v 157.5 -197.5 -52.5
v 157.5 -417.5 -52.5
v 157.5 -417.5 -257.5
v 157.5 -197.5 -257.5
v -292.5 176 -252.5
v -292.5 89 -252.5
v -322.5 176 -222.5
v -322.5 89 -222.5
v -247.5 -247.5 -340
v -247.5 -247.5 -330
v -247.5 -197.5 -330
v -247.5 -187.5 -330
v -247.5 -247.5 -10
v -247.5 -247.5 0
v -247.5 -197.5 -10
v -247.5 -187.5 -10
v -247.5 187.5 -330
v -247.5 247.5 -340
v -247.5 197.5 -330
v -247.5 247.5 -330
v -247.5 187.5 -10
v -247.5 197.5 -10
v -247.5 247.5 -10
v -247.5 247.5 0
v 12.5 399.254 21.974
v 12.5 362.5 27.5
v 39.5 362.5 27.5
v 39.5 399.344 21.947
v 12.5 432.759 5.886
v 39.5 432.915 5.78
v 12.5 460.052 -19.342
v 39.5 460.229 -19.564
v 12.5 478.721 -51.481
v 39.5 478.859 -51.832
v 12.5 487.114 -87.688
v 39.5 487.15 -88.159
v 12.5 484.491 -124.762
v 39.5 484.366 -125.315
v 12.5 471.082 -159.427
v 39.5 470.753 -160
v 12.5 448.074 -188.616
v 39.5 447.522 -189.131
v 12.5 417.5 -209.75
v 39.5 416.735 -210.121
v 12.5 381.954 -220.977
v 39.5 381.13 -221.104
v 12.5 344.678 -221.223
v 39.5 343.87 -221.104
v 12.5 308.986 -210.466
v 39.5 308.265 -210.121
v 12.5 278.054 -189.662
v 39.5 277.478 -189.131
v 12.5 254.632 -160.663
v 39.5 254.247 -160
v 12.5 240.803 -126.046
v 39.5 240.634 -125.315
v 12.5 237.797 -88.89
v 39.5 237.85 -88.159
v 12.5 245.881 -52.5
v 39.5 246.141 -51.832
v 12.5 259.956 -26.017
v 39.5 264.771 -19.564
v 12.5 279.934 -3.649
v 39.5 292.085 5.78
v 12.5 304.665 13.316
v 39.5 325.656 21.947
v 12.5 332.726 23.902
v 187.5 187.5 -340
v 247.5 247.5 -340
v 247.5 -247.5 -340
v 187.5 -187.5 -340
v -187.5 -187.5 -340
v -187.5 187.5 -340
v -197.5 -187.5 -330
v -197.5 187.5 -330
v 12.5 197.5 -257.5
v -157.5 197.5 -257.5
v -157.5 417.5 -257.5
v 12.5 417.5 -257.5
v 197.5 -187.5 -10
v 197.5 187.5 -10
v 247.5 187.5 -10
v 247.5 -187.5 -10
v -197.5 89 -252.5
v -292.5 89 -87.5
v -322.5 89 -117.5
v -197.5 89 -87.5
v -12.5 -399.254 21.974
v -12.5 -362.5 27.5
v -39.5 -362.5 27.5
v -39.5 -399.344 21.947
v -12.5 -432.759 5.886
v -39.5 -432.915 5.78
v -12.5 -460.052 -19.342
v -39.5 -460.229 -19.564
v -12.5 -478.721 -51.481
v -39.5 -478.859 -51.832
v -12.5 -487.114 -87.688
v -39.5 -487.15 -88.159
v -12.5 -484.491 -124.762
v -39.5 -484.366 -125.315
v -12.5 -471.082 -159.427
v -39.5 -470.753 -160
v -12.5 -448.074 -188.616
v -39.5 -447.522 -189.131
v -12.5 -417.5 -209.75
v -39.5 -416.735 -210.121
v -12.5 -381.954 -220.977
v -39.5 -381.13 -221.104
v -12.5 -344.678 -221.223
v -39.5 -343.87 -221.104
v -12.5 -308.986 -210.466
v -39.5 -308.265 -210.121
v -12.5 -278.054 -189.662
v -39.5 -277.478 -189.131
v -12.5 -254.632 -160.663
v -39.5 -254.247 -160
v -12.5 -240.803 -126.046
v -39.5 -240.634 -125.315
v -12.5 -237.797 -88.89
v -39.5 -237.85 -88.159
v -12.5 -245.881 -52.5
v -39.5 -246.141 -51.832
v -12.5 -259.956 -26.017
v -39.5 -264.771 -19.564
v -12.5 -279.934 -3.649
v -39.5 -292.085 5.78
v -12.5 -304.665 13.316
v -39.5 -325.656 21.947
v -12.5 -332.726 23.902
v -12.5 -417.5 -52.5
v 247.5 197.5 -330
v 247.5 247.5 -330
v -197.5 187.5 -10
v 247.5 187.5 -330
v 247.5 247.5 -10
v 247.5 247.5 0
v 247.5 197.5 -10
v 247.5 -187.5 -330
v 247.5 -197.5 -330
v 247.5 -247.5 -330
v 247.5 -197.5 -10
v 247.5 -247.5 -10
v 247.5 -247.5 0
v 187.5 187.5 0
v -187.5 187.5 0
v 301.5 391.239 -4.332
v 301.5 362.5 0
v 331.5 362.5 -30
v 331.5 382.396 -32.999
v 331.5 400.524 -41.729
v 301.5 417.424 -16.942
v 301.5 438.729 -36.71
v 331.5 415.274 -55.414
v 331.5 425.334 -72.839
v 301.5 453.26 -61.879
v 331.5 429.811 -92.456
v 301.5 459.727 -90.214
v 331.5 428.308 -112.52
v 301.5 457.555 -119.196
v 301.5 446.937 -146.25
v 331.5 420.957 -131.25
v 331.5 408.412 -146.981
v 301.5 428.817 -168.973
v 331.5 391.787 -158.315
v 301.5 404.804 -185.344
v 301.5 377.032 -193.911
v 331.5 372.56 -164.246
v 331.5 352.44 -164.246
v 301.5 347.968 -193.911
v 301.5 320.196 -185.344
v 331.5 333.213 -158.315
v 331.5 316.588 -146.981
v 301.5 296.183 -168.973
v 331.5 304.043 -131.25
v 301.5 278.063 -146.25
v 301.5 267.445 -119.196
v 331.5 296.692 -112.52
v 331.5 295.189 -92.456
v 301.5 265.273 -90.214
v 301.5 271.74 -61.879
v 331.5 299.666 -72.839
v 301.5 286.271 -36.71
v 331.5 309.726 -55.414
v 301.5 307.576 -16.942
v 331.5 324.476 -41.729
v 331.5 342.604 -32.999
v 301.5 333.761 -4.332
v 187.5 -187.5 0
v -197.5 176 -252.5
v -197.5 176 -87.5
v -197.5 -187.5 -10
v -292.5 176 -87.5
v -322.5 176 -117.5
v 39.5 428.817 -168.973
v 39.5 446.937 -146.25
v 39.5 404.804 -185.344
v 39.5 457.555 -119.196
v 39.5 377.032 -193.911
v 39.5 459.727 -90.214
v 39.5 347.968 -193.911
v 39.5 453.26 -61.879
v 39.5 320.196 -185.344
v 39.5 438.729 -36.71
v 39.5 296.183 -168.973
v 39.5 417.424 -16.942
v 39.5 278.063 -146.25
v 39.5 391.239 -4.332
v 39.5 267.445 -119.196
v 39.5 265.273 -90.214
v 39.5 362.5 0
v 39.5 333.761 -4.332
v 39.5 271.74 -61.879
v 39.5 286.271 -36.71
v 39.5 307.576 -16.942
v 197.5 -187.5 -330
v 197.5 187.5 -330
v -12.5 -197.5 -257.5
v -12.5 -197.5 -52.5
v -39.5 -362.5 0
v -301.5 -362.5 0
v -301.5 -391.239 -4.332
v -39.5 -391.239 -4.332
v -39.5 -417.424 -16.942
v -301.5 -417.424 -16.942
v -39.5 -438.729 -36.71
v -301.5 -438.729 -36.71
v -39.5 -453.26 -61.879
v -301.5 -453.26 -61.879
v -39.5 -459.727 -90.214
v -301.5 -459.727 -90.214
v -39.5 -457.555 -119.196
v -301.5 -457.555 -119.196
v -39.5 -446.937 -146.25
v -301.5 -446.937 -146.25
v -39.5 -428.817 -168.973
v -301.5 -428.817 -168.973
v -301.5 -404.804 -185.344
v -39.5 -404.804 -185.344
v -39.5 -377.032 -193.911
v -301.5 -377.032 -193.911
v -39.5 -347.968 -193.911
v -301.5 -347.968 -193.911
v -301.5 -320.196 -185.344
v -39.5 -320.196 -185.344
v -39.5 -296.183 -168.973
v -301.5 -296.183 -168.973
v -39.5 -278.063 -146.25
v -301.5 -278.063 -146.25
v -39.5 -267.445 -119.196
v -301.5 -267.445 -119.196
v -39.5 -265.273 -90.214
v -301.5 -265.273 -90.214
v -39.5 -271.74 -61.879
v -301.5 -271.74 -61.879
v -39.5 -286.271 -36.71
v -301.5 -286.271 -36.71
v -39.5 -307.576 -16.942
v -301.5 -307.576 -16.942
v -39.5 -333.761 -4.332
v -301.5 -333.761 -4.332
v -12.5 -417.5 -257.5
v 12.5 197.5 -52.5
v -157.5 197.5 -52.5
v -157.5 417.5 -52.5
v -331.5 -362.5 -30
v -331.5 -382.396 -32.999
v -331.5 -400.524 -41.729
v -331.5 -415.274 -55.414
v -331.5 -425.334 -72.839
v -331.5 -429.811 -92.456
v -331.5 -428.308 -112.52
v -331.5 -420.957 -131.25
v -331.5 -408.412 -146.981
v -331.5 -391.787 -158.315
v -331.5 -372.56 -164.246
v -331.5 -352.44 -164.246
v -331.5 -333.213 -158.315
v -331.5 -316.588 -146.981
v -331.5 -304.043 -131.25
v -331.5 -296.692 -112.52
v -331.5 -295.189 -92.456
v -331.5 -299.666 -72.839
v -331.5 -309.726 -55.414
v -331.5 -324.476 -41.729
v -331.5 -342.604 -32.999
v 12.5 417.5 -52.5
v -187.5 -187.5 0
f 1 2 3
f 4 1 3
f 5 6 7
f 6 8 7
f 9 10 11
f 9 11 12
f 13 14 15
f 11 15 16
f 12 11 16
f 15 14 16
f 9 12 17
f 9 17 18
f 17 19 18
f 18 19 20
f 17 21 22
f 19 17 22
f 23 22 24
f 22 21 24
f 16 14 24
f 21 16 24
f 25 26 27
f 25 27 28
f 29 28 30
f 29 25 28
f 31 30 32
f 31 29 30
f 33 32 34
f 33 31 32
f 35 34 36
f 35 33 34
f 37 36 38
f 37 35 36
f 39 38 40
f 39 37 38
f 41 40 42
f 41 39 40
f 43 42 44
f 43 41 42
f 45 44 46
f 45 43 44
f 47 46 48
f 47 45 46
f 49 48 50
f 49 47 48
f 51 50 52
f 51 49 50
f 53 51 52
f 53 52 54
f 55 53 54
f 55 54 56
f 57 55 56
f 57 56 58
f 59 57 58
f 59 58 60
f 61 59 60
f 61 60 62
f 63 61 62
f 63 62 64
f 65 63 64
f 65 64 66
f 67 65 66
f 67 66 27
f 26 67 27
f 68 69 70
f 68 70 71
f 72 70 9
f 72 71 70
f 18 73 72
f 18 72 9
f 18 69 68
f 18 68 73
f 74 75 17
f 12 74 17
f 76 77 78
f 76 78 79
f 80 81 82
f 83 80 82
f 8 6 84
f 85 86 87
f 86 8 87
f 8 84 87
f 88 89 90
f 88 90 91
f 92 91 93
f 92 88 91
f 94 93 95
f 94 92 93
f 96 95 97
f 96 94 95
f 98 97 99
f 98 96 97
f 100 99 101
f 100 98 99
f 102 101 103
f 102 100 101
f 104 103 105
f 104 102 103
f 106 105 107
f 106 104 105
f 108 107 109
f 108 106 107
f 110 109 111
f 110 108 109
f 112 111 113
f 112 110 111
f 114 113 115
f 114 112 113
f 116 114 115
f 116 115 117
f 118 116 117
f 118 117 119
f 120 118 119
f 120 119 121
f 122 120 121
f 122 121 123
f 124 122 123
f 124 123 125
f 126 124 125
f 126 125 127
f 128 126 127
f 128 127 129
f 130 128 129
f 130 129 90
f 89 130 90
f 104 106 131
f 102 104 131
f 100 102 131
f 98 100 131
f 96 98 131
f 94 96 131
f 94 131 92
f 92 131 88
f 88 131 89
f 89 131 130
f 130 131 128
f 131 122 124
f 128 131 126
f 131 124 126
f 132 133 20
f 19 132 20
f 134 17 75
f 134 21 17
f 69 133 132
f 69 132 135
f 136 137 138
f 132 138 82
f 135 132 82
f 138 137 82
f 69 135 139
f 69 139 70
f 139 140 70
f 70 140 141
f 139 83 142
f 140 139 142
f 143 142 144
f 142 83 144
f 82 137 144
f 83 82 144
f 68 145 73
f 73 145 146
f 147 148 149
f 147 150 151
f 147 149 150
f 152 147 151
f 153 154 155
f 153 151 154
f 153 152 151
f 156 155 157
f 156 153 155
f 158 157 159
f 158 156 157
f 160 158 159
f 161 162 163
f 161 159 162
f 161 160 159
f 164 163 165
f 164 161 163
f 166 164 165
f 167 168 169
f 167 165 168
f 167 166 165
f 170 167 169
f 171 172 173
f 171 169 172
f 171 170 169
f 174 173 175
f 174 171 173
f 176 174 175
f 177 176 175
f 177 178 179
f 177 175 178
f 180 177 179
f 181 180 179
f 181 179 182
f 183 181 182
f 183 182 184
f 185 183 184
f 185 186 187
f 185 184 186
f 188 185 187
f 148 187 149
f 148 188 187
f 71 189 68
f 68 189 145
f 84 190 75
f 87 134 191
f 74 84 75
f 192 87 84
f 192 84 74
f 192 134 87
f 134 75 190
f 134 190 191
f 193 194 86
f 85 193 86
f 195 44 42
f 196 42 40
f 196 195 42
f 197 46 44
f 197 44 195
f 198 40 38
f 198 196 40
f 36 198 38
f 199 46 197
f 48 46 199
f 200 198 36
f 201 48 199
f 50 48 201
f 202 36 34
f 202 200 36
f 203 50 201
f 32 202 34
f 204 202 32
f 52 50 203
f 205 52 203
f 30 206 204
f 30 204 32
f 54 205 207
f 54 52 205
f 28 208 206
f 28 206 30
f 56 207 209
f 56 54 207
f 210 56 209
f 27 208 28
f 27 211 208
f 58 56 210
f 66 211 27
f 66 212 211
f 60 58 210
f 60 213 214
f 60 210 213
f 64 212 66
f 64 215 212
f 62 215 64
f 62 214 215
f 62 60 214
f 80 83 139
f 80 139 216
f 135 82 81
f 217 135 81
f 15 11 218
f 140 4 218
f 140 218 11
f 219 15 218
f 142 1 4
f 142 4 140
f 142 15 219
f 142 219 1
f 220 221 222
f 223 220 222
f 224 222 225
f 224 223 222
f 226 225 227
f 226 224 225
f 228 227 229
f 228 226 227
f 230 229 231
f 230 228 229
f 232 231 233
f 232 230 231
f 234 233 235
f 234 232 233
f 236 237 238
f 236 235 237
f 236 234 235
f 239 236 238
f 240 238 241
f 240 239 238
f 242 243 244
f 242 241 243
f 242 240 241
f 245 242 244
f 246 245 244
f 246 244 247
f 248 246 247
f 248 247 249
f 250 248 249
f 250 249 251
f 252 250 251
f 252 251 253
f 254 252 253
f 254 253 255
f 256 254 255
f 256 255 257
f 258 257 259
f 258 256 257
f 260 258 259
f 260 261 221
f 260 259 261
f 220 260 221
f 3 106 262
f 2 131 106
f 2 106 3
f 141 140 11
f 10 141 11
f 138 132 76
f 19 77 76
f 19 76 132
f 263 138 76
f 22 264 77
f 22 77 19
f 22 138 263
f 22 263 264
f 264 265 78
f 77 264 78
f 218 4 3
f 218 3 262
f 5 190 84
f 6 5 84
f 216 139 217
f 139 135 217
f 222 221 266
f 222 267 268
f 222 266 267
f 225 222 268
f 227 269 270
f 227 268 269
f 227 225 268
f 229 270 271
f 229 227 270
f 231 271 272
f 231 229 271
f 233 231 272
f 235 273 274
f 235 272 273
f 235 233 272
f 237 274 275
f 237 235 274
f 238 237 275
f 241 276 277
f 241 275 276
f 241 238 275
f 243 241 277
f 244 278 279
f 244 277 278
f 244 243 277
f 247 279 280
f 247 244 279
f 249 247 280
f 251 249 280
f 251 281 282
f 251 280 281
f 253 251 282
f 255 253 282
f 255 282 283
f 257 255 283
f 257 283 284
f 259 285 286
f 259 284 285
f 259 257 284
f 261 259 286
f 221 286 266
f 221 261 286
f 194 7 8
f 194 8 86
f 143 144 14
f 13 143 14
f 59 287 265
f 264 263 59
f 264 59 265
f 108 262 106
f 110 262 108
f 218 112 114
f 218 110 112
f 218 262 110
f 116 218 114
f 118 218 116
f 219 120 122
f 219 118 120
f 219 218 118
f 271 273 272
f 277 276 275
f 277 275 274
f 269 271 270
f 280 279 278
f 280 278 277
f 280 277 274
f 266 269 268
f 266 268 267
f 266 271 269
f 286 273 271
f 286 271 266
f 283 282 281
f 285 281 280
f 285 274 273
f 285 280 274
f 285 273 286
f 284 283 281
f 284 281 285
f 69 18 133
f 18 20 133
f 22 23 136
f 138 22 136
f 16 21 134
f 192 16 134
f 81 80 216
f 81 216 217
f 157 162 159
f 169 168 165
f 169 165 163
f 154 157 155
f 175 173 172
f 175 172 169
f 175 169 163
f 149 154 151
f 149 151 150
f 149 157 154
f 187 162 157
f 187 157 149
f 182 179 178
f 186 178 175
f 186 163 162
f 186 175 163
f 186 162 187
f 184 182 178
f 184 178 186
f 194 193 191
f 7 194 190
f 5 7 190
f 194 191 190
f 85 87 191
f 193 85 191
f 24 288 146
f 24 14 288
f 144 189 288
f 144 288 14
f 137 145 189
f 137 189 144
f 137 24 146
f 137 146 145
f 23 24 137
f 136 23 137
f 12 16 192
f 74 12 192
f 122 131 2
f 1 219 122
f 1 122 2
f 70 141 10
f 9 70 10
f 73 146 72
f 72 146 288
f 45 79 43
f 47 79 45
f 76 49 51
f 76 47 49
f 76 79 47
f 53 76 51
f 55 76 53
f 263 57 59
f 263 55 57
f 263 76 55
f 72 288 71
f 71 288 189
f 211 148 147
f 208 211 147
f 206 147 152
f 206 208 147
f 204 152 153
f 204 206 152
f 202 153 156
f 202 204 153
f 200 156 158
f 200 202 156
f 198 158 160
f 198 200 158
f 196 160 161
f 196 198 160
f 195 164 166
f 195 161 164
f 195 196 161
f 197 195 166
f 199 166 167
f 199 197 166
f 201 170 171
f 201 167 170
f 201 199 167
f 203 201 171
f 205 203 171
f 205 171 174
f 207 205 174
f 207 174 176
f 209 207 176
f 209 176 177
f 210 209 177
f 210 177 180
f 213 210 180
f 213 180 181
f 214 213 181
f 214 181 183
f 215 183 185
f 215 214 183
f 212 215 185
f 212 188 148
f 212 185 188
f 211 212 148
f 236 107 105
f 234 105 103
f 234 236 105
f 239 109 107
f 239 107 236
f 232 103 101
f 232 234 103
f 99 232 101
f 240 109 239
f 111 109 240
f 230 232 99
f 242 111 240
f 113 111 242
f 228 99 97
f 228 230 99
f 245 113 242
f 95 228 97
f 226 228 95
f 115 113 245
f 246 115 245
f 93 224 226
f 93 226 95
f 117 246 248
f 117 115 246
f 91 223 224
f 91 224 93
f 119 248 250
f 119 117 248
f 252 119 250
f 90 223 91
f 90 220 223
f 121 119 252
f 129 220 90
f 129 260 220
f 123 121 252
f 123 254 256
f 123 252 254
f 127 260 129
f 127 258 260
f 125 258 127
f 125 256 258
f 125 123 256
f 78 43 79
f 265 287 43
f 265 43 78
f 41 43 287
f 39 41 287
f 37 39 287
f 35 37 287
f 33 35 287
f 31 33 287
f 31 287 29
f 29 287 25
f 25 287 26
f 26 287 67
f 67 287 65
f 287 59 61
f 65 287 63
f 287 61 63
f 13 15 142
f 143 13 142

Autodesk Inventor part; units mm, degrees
ref_plane "YZ Plane" through (0, 0, 0) normal (1, 0, 0) x (0, 1, 0)
ref_plane "XZ Plane" through (0, 0, 0) normal (0, 1, 0) x (-1, 0, 0)
ref_plane "XY Plane" through (0, 0, 0) normal (0, 0, 1) x (1, 0, 0)
sketch "Sketch1" plane through (0, 0, 0) normal (0, 0, 1) x (1, 0, 0)
  line L0 (-247.5, 247.5) -> (247.5, 247.5)
  line L1 (247.5, 247.5) -> (247.5, -247.5)
  line L2 (247.5, -247.5) -> (-247.5, -247.5)
  line L3 (-247.5, -247.5) -> (-247.5, 247.5)
  line L4 (-247.5, -247.5) -> (247.5, 247.5) construction
  point P0 (0, 0)
  point P1 (0, 0)
  dimension "d0" = 495
  dimension "d1" = 495
extrude "Extrusion1" add sketch "Sketch1" against normal blind 10
sketch "Sketch2" plane through (0, 0, -10) normal (0, 0, -1) x (-1, 0, 0)
  line L0 (197.5, -197.5) -> (-197.5, -197.5)
  line L1 (-197.5, -197.5) -> (-197.5, 197.5)
  line L2 (-197.5, 197.5) -> (197.5, 197.5)
  line L3 (197.5, 197.5) -> (197.5, -197.5)
  line L4 (197.5, -197.5) -> (-197.5, 197.5) construction
  line L5 (247.5, -247.5) -> (247.5, 247.5) projected
  line L6 (197.5, -197.5) -> (247.5, -197.5)
  line L7 (247.5, -197.5) -> (247.5, -187.5)
  line L8 (247.5, -187.5) -> (197.5, -187.5)
  line L9 (197.5, -187.5) -> (197.5, -197.5)
  line L10 (197.5, 197.5) -> (247.5, 197.5)
  line L11 (247.5, 197.5) -> (247.5, 187.5)
  line L12 (247.5, 187.5) -> (197.5, 187.5)
  line L13 (197.5, 187.5) -> (197.5, 197.5)
  line L14 (-247.5, 247.5) -> (-247.5, -247.5) projected
  line L15 (-197.5, -197.5) -> (-247.5, -197.5)
  line L16 (-247.5, -197.5) -> (-247.5, -187.5)
  line L17 (-247.5, -187.5) -> (-197.5, -187.5)
  line L18 (-197.5, -187.5) -> (-197.5, -197.5)
  line L19 (-197.5, 197.5) -> (-247.5, 197.5)
  line L20 (-247.5, 197.5) -> (-247.5, 187.5)
  line L21 (-247.5, 187.5) -> (-197.5, 187.5)
  line L22 (-197.5, 187.5) -> (-197.5, 197.5)
  point P0 (0, 0)
  point P1 (0, 0)
  dimension "d4" = 395
  dimension "d5" = 395
  dimension "d19" = 10
  dimension "d20" = 10
  dimension "d21" = 10
  dimension "d22" = 10
extrude "Extrusion2" add sketch "Sketch2" along normal blind 320 contours L0 L1 L2 L3 | L3 L8 L5 L6 | L15 L14 L17 L1 | L3 L10 L5 L12 | L21 L14 L19 L1
sketch "Sketch3" plane through (0, 0, -330) normal (0, 0, -1) x (-1, 0, 0)
  line L0 (-247.5, -247.5) -> (247.5, -247.5)
  line L1 (247.5, -247.5) -> (247.5, 247.5)
  line L2 (247.5, 247.5) -> (-247.5, 247.5)
  line L3 (-247.5, 247.5) -> (-247.5, -247.5)
  line L4 (-247.5, -247.5) -> (247.5, 247.5) construction
  point P0 (0, 0)
  point P1 (0, 0)
  dimension "d8" = 495
  dimension "d9" = 495
extrude "Extrusion3" add sketch "Sketch3" along normal blind 10
sketch "Sketch4" plane through (0, 0, 0) normal (0, 0, 1) x (1, 0, 0)
  line L0 (-187.5, -187.5) -> (187.5, -187.5)
  line L1 (187.5, -187.5) -> (187.5, 187.5)
  line L2 (187.5, 187.5) -> (-187.5, 187.5)
  line L3 (-187.5, 187.5) -> (-187.5, -187.5)
  line L4 (-187.5, -187.5) -> (187.5, 187.5) construction
  point P0 (0, 0)
  point P1 (0, 0)
  dimension "d12" = 375
  dimension "d13" = 375
extrude "Extrusion4" cut sketch "Sketch4" against normal through all
sketch "Sketch6" plane through (-247.5, -197.5, -10) normal (0, -1, 0) x (1, 0, 0)
  line L0 (235, -42.5) -> (405, -42.5)
  line L1 (405, -42.5) -> (405, -247.5)
  line L2 (405, -247.5) -> (235, -247.5)
  line L3 (235, -247.5) -> (235, -42.5)
  line L4 (235, -42.5) -> (405, -247.5) construction
  line L5 (495, 0) -> (495, -320) projected
  line L6 (495, -330) -> (0, -330) projected
  point P0 (247.5, 10)
  point P1 (320, -145)
  dimension "d23" = 205
  dimension "d24" = 170
  dimension "d25" = 175
  dimension "d26" = 185
extrude "Extrusion5" add sketch "Sketch6" along normal blind 220
sketch "Sketch7" plane through (-12.5, -197.5, -257.5) normal (-1, 0, 0) x (0, 0, 1)
  circle A0 centre (160, -165) radius 125
  line L0 (205, 0) -> (205, -220) projected
  line L1 (205, -220) -> (0, -220) projected
  point P0 (257.5, 197.5)
  dimension "d5" = 395
  dimension "d30" = 250
  dimension "d33" = 45
  dimension "d34" = 55
extrude "Extrusion6" add sketch "Sketch7" along normal blind 27
sketch "Sketch8" plane through (-39.5, -362.5, -97.5) normal (-1, 0, 0) x (0, 0, 1)
  circle A0 centre (0, 0) radius 97.5
  circle A1 centre (0, 0) radius 125 projected
  point P0 (97.5, 362.5)
  dimension "d37" = 195
extrude "Extrusion7" add sketch "Sketch8" along normal blind 292 contours A0
pattern_circular "Circular Pattern1" count 2 over 360 about axis through (0, 0, -10) along (0, 0, 1) of "Extrusion7", "Extrusion6", "Extrusion5"
sketch "Sketch10" plane through (-197.5, -187.5, -10) normal (-1, 0, 0) x (0, 0, 1)
  line L0 (-77.5, 363.5) -> (-242.5, 363.5)
  line L1 (-242.5, 363.5) -> (-242.5, 276.5)
  line L2 (-242.5, 276.5) -> (-77.5, 276.5)
  line L3 (-77.5, 276.5) -> (-77.5, 363.5)
  line L4 (0, 375) -> (-320, 375) projected
  point P0 (10, 187.5)
  point P1 (-77.5, 320)
  point P2 (-160, 363.5)
  point P3 (-160, 375)
  dimension "d44" = 165
  dimension "d45" = 87
  dimension "d46" = 55
extrude "Extrusion8" add sketch "Sketch10" along normal blind 125
chamfer "Chamfer1" distance 30 angle 45 2 edges at (-322.5, 132.5, -87.5) (-322.5, 132.5, -252.5)
chamfer "Chamfer2" distance 30 angle 45 2 edges at (331.5, 362.5, -195) (-331.5, -362.5, -195)
equation "\"d1\" = d0"
equation "\"d5\" = d4"
equation "\"d20\" = d19"
equation "\"d21\" = d19"
equation "\"d22\" = d19"
equation "\"d8\" = d0"
equation "\"d9\" = d8"
properties part number "Измельчитель комков"
